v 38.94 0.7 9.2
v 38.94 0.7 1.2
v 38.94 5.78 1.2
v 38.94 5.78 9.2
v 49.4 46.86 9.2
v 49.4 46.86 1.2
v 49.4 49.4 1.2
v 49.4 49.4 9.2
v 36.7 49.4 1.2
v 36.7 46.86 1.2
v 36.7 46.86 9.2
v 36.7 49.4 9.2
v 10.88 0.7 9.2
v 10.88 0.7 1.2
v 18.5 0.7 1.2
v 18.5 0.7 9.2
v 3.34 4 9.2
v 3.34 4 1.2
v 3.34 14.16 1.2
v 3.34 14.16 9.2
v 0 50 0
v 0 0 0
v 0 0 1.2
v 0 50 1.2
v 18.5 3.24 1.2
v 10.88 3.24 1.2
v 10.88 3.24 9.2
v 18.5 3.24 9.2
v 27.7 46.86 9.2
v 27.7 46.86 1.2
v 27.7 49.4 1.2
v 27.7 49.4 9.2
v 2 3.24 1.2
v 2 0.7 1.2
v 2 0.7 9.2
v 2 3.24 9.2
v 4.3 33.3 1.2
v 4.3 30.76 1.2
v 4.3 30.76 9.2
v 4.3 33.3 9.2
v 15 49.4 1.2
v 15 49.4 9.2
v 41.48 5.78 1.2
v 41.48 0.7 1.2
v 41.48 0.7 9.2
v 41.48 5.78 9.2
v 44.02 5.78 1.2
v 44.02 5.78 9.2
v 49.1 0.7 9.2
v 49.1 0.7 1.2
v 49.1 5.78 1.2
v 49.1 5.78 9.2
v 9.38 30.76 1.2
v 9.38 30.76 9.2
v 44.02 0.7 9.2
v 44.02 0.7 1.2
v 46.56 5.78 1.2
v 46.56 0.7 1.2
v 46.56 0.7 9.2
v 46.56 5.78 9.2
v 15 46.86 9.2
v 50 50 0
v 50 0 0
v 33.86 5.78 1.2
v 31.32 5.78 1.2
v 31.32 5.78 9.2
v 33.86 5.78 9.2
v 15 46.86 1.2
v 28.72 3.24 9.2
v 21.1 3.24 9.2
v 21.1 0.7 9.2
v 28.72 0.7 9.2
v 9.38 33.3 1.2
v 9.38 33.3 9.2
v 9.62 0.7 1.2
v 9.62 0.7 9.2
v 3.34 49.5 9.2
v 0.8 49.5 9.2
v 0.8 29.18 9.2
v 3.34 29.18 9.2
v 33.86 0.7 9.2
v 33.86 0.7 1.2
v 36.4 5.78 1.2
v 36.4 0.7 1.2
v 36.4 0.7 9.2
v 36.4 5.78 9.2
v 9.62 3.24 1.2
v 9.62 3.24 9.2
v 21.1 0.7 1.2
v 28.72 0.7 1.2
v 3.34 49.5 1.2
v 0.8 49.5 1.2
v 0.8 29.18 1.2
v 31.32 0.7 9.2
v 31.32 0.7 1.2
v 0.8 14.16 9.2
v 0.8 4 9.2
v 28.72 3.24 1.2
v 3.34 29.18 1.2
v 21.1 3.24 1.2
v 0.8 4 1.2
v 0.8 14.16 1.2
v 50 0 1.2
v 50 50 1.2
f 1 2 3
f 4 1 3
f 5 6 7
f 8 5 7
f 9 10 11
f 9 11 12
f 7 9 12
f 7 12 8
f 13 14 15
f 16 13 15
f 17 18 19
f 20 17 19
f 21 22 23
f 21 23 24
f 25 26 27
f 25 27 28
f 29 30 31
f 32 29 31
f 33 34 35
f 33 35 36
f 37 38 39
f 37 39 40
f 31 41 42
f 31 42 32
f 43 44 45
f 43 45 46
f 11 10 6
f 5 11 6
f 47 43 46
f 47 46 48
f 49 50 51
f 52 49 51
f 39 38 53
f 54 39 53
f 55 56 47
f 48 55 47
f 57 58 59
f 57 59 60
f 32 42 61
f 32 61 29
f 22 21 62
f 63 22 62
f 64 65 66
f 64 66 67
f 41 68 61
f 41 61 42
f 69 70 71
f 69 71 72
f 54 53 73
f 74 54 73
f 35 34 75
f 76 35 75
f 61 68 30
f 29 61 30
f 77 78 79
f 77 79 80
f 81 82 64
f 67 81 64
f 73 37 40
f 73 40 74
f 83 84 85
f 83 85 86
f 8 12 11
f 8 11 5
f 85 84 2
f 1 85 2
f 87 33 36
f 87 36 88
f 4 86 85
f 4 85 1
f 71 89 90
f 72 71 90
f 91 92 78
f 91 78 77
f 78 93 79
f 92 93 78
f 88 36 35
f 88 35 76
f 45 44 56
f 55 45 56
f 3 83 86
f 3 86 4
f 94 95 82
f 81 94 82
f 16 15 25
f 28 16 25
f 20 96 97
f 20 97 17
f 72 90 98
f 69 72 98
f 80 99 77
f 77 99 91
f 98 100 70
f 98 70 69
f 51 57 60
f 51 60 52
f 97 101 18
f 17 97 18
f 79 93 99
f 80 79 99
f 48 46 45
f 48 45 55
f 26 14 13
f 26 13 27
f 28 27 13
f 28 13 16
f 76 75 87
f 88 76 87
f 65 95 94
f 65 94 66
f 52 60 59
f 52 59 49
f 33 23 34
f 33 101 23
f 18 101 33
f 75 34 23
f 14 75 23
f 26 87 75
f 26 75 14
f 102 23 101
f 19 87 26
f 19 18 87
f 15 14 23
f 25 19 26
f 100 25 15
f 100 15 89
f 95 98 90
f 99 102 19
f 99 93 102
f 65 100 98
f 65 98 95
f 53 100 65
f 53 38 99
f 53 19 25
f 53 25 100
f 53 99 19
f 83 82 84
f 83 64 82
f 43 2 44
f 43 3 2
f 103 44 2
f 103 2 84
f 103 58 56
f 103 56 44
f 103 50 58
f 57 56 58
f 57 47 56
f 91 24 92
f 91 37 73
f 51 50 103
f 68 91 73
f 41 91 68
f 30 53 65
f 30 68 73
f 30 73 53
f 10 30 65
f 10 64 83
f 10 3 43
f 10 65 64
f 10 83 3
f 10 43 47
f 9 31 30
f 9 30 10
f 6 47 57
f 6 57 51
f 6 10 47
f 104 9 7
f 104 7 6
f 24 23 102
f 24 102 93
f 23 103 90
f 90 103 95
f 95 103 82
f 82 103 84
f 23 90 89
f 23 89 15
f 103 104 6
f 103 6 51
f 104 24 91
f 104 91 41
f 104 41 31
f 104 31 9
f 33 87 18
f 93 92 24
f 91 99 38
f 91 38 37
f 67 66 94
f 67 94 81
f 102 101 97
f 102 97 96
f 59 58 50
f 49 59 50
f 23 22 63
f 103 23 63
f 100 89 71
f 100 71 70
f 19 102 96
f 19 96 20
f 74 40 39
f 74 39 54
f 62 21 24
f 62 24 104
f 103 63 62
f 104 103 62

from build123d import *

# Parameters (mm, degrees)
CROQUIS1_W              = 50
CROQUIS1_H              = 50
SALIENTE_EXTRUIR1_DEPTH = 1.2
CROQUIS2_W              = 12.7
CROQUIS2_H              = 2.54
CROQUIS2_W_2            = 2.54
CROQUIS2_H_2            = 20.32
CROQUIS2_W_3            = 5.08
CROQUIS2_H_3            = 10.16
CROQUIS2_W_4            = 7.62
CROQUIS2_H_4            = 5.08
SALIENTE_EXTRUIR2_DEPTH = 8


with BuildPart() as part:
    # Croquis1 → Saliente-Extruir1 (new body)
    with BuildSketch(Plane.XY):
        with Locations((25, 25)):
            Rectangle(CROQUIS1_W, CROQUIS1_H)
    extrude(amount=SALIENTE_EXTRUIR1_DEPTH)

    # Croquis2 → Saliente-Extruir2 (add)
    with BuildSketch(Plane.XY.offset(1.2)):
        with Locations((43.05, 48.13)):
            Rectangle(CROQUIS2_W, CROQUIS2_H)
        with Locations((21.35, 48.13)):
            Rectangle(CROQUIS2_W, CROQUIS2_H)
        with Locations((2.07, 39.34)):
            Rectangle(CROQUIS2_W_2, CROQUIS2_H_2)
        with Locations((6.84, 32.03)):
            Rectangle(CROQUIS2_W_3, CROQUIS2_H)
        with Locations((2.07, 9.08)):
            Rectangle(CROQUIS2_W_2, CROQUIS2_H_3)
        with Locations((5.81, 1.97)):
            Rectangle(CROQUIS2_W_4, CROQUIS2_H)
        with Locations((14.69, 1.97)):
            Rectangle(CROQUIS2_W_4, CROQUIS2_H)
        with Locations((24.91, 1.97)):
            Rectangle(CROQUIS2_W_4, CROQUIS2_H)
        with Locations((32.59, 3.24)):
            Rectangle(CROQUIS2_W_2, CROQUIS2_H_4)
        with Locations((37.67, 3.24)):
            Rectangle(CROQUIS2_W_2, CROQUIS2_H_4)
        with Locations((42.75, 3.24)):
            Rectangle(CROQUIS2_W_2, CROQUIS2_H_4)
        with Locations((47.83, 3.24)):
            Rectangle(CROQUIS2_W_2, CROQUIS2_H_4)
    extrude(amount=SALIENTE_EXTRUIR2_DEPTH)


solid = part.part
